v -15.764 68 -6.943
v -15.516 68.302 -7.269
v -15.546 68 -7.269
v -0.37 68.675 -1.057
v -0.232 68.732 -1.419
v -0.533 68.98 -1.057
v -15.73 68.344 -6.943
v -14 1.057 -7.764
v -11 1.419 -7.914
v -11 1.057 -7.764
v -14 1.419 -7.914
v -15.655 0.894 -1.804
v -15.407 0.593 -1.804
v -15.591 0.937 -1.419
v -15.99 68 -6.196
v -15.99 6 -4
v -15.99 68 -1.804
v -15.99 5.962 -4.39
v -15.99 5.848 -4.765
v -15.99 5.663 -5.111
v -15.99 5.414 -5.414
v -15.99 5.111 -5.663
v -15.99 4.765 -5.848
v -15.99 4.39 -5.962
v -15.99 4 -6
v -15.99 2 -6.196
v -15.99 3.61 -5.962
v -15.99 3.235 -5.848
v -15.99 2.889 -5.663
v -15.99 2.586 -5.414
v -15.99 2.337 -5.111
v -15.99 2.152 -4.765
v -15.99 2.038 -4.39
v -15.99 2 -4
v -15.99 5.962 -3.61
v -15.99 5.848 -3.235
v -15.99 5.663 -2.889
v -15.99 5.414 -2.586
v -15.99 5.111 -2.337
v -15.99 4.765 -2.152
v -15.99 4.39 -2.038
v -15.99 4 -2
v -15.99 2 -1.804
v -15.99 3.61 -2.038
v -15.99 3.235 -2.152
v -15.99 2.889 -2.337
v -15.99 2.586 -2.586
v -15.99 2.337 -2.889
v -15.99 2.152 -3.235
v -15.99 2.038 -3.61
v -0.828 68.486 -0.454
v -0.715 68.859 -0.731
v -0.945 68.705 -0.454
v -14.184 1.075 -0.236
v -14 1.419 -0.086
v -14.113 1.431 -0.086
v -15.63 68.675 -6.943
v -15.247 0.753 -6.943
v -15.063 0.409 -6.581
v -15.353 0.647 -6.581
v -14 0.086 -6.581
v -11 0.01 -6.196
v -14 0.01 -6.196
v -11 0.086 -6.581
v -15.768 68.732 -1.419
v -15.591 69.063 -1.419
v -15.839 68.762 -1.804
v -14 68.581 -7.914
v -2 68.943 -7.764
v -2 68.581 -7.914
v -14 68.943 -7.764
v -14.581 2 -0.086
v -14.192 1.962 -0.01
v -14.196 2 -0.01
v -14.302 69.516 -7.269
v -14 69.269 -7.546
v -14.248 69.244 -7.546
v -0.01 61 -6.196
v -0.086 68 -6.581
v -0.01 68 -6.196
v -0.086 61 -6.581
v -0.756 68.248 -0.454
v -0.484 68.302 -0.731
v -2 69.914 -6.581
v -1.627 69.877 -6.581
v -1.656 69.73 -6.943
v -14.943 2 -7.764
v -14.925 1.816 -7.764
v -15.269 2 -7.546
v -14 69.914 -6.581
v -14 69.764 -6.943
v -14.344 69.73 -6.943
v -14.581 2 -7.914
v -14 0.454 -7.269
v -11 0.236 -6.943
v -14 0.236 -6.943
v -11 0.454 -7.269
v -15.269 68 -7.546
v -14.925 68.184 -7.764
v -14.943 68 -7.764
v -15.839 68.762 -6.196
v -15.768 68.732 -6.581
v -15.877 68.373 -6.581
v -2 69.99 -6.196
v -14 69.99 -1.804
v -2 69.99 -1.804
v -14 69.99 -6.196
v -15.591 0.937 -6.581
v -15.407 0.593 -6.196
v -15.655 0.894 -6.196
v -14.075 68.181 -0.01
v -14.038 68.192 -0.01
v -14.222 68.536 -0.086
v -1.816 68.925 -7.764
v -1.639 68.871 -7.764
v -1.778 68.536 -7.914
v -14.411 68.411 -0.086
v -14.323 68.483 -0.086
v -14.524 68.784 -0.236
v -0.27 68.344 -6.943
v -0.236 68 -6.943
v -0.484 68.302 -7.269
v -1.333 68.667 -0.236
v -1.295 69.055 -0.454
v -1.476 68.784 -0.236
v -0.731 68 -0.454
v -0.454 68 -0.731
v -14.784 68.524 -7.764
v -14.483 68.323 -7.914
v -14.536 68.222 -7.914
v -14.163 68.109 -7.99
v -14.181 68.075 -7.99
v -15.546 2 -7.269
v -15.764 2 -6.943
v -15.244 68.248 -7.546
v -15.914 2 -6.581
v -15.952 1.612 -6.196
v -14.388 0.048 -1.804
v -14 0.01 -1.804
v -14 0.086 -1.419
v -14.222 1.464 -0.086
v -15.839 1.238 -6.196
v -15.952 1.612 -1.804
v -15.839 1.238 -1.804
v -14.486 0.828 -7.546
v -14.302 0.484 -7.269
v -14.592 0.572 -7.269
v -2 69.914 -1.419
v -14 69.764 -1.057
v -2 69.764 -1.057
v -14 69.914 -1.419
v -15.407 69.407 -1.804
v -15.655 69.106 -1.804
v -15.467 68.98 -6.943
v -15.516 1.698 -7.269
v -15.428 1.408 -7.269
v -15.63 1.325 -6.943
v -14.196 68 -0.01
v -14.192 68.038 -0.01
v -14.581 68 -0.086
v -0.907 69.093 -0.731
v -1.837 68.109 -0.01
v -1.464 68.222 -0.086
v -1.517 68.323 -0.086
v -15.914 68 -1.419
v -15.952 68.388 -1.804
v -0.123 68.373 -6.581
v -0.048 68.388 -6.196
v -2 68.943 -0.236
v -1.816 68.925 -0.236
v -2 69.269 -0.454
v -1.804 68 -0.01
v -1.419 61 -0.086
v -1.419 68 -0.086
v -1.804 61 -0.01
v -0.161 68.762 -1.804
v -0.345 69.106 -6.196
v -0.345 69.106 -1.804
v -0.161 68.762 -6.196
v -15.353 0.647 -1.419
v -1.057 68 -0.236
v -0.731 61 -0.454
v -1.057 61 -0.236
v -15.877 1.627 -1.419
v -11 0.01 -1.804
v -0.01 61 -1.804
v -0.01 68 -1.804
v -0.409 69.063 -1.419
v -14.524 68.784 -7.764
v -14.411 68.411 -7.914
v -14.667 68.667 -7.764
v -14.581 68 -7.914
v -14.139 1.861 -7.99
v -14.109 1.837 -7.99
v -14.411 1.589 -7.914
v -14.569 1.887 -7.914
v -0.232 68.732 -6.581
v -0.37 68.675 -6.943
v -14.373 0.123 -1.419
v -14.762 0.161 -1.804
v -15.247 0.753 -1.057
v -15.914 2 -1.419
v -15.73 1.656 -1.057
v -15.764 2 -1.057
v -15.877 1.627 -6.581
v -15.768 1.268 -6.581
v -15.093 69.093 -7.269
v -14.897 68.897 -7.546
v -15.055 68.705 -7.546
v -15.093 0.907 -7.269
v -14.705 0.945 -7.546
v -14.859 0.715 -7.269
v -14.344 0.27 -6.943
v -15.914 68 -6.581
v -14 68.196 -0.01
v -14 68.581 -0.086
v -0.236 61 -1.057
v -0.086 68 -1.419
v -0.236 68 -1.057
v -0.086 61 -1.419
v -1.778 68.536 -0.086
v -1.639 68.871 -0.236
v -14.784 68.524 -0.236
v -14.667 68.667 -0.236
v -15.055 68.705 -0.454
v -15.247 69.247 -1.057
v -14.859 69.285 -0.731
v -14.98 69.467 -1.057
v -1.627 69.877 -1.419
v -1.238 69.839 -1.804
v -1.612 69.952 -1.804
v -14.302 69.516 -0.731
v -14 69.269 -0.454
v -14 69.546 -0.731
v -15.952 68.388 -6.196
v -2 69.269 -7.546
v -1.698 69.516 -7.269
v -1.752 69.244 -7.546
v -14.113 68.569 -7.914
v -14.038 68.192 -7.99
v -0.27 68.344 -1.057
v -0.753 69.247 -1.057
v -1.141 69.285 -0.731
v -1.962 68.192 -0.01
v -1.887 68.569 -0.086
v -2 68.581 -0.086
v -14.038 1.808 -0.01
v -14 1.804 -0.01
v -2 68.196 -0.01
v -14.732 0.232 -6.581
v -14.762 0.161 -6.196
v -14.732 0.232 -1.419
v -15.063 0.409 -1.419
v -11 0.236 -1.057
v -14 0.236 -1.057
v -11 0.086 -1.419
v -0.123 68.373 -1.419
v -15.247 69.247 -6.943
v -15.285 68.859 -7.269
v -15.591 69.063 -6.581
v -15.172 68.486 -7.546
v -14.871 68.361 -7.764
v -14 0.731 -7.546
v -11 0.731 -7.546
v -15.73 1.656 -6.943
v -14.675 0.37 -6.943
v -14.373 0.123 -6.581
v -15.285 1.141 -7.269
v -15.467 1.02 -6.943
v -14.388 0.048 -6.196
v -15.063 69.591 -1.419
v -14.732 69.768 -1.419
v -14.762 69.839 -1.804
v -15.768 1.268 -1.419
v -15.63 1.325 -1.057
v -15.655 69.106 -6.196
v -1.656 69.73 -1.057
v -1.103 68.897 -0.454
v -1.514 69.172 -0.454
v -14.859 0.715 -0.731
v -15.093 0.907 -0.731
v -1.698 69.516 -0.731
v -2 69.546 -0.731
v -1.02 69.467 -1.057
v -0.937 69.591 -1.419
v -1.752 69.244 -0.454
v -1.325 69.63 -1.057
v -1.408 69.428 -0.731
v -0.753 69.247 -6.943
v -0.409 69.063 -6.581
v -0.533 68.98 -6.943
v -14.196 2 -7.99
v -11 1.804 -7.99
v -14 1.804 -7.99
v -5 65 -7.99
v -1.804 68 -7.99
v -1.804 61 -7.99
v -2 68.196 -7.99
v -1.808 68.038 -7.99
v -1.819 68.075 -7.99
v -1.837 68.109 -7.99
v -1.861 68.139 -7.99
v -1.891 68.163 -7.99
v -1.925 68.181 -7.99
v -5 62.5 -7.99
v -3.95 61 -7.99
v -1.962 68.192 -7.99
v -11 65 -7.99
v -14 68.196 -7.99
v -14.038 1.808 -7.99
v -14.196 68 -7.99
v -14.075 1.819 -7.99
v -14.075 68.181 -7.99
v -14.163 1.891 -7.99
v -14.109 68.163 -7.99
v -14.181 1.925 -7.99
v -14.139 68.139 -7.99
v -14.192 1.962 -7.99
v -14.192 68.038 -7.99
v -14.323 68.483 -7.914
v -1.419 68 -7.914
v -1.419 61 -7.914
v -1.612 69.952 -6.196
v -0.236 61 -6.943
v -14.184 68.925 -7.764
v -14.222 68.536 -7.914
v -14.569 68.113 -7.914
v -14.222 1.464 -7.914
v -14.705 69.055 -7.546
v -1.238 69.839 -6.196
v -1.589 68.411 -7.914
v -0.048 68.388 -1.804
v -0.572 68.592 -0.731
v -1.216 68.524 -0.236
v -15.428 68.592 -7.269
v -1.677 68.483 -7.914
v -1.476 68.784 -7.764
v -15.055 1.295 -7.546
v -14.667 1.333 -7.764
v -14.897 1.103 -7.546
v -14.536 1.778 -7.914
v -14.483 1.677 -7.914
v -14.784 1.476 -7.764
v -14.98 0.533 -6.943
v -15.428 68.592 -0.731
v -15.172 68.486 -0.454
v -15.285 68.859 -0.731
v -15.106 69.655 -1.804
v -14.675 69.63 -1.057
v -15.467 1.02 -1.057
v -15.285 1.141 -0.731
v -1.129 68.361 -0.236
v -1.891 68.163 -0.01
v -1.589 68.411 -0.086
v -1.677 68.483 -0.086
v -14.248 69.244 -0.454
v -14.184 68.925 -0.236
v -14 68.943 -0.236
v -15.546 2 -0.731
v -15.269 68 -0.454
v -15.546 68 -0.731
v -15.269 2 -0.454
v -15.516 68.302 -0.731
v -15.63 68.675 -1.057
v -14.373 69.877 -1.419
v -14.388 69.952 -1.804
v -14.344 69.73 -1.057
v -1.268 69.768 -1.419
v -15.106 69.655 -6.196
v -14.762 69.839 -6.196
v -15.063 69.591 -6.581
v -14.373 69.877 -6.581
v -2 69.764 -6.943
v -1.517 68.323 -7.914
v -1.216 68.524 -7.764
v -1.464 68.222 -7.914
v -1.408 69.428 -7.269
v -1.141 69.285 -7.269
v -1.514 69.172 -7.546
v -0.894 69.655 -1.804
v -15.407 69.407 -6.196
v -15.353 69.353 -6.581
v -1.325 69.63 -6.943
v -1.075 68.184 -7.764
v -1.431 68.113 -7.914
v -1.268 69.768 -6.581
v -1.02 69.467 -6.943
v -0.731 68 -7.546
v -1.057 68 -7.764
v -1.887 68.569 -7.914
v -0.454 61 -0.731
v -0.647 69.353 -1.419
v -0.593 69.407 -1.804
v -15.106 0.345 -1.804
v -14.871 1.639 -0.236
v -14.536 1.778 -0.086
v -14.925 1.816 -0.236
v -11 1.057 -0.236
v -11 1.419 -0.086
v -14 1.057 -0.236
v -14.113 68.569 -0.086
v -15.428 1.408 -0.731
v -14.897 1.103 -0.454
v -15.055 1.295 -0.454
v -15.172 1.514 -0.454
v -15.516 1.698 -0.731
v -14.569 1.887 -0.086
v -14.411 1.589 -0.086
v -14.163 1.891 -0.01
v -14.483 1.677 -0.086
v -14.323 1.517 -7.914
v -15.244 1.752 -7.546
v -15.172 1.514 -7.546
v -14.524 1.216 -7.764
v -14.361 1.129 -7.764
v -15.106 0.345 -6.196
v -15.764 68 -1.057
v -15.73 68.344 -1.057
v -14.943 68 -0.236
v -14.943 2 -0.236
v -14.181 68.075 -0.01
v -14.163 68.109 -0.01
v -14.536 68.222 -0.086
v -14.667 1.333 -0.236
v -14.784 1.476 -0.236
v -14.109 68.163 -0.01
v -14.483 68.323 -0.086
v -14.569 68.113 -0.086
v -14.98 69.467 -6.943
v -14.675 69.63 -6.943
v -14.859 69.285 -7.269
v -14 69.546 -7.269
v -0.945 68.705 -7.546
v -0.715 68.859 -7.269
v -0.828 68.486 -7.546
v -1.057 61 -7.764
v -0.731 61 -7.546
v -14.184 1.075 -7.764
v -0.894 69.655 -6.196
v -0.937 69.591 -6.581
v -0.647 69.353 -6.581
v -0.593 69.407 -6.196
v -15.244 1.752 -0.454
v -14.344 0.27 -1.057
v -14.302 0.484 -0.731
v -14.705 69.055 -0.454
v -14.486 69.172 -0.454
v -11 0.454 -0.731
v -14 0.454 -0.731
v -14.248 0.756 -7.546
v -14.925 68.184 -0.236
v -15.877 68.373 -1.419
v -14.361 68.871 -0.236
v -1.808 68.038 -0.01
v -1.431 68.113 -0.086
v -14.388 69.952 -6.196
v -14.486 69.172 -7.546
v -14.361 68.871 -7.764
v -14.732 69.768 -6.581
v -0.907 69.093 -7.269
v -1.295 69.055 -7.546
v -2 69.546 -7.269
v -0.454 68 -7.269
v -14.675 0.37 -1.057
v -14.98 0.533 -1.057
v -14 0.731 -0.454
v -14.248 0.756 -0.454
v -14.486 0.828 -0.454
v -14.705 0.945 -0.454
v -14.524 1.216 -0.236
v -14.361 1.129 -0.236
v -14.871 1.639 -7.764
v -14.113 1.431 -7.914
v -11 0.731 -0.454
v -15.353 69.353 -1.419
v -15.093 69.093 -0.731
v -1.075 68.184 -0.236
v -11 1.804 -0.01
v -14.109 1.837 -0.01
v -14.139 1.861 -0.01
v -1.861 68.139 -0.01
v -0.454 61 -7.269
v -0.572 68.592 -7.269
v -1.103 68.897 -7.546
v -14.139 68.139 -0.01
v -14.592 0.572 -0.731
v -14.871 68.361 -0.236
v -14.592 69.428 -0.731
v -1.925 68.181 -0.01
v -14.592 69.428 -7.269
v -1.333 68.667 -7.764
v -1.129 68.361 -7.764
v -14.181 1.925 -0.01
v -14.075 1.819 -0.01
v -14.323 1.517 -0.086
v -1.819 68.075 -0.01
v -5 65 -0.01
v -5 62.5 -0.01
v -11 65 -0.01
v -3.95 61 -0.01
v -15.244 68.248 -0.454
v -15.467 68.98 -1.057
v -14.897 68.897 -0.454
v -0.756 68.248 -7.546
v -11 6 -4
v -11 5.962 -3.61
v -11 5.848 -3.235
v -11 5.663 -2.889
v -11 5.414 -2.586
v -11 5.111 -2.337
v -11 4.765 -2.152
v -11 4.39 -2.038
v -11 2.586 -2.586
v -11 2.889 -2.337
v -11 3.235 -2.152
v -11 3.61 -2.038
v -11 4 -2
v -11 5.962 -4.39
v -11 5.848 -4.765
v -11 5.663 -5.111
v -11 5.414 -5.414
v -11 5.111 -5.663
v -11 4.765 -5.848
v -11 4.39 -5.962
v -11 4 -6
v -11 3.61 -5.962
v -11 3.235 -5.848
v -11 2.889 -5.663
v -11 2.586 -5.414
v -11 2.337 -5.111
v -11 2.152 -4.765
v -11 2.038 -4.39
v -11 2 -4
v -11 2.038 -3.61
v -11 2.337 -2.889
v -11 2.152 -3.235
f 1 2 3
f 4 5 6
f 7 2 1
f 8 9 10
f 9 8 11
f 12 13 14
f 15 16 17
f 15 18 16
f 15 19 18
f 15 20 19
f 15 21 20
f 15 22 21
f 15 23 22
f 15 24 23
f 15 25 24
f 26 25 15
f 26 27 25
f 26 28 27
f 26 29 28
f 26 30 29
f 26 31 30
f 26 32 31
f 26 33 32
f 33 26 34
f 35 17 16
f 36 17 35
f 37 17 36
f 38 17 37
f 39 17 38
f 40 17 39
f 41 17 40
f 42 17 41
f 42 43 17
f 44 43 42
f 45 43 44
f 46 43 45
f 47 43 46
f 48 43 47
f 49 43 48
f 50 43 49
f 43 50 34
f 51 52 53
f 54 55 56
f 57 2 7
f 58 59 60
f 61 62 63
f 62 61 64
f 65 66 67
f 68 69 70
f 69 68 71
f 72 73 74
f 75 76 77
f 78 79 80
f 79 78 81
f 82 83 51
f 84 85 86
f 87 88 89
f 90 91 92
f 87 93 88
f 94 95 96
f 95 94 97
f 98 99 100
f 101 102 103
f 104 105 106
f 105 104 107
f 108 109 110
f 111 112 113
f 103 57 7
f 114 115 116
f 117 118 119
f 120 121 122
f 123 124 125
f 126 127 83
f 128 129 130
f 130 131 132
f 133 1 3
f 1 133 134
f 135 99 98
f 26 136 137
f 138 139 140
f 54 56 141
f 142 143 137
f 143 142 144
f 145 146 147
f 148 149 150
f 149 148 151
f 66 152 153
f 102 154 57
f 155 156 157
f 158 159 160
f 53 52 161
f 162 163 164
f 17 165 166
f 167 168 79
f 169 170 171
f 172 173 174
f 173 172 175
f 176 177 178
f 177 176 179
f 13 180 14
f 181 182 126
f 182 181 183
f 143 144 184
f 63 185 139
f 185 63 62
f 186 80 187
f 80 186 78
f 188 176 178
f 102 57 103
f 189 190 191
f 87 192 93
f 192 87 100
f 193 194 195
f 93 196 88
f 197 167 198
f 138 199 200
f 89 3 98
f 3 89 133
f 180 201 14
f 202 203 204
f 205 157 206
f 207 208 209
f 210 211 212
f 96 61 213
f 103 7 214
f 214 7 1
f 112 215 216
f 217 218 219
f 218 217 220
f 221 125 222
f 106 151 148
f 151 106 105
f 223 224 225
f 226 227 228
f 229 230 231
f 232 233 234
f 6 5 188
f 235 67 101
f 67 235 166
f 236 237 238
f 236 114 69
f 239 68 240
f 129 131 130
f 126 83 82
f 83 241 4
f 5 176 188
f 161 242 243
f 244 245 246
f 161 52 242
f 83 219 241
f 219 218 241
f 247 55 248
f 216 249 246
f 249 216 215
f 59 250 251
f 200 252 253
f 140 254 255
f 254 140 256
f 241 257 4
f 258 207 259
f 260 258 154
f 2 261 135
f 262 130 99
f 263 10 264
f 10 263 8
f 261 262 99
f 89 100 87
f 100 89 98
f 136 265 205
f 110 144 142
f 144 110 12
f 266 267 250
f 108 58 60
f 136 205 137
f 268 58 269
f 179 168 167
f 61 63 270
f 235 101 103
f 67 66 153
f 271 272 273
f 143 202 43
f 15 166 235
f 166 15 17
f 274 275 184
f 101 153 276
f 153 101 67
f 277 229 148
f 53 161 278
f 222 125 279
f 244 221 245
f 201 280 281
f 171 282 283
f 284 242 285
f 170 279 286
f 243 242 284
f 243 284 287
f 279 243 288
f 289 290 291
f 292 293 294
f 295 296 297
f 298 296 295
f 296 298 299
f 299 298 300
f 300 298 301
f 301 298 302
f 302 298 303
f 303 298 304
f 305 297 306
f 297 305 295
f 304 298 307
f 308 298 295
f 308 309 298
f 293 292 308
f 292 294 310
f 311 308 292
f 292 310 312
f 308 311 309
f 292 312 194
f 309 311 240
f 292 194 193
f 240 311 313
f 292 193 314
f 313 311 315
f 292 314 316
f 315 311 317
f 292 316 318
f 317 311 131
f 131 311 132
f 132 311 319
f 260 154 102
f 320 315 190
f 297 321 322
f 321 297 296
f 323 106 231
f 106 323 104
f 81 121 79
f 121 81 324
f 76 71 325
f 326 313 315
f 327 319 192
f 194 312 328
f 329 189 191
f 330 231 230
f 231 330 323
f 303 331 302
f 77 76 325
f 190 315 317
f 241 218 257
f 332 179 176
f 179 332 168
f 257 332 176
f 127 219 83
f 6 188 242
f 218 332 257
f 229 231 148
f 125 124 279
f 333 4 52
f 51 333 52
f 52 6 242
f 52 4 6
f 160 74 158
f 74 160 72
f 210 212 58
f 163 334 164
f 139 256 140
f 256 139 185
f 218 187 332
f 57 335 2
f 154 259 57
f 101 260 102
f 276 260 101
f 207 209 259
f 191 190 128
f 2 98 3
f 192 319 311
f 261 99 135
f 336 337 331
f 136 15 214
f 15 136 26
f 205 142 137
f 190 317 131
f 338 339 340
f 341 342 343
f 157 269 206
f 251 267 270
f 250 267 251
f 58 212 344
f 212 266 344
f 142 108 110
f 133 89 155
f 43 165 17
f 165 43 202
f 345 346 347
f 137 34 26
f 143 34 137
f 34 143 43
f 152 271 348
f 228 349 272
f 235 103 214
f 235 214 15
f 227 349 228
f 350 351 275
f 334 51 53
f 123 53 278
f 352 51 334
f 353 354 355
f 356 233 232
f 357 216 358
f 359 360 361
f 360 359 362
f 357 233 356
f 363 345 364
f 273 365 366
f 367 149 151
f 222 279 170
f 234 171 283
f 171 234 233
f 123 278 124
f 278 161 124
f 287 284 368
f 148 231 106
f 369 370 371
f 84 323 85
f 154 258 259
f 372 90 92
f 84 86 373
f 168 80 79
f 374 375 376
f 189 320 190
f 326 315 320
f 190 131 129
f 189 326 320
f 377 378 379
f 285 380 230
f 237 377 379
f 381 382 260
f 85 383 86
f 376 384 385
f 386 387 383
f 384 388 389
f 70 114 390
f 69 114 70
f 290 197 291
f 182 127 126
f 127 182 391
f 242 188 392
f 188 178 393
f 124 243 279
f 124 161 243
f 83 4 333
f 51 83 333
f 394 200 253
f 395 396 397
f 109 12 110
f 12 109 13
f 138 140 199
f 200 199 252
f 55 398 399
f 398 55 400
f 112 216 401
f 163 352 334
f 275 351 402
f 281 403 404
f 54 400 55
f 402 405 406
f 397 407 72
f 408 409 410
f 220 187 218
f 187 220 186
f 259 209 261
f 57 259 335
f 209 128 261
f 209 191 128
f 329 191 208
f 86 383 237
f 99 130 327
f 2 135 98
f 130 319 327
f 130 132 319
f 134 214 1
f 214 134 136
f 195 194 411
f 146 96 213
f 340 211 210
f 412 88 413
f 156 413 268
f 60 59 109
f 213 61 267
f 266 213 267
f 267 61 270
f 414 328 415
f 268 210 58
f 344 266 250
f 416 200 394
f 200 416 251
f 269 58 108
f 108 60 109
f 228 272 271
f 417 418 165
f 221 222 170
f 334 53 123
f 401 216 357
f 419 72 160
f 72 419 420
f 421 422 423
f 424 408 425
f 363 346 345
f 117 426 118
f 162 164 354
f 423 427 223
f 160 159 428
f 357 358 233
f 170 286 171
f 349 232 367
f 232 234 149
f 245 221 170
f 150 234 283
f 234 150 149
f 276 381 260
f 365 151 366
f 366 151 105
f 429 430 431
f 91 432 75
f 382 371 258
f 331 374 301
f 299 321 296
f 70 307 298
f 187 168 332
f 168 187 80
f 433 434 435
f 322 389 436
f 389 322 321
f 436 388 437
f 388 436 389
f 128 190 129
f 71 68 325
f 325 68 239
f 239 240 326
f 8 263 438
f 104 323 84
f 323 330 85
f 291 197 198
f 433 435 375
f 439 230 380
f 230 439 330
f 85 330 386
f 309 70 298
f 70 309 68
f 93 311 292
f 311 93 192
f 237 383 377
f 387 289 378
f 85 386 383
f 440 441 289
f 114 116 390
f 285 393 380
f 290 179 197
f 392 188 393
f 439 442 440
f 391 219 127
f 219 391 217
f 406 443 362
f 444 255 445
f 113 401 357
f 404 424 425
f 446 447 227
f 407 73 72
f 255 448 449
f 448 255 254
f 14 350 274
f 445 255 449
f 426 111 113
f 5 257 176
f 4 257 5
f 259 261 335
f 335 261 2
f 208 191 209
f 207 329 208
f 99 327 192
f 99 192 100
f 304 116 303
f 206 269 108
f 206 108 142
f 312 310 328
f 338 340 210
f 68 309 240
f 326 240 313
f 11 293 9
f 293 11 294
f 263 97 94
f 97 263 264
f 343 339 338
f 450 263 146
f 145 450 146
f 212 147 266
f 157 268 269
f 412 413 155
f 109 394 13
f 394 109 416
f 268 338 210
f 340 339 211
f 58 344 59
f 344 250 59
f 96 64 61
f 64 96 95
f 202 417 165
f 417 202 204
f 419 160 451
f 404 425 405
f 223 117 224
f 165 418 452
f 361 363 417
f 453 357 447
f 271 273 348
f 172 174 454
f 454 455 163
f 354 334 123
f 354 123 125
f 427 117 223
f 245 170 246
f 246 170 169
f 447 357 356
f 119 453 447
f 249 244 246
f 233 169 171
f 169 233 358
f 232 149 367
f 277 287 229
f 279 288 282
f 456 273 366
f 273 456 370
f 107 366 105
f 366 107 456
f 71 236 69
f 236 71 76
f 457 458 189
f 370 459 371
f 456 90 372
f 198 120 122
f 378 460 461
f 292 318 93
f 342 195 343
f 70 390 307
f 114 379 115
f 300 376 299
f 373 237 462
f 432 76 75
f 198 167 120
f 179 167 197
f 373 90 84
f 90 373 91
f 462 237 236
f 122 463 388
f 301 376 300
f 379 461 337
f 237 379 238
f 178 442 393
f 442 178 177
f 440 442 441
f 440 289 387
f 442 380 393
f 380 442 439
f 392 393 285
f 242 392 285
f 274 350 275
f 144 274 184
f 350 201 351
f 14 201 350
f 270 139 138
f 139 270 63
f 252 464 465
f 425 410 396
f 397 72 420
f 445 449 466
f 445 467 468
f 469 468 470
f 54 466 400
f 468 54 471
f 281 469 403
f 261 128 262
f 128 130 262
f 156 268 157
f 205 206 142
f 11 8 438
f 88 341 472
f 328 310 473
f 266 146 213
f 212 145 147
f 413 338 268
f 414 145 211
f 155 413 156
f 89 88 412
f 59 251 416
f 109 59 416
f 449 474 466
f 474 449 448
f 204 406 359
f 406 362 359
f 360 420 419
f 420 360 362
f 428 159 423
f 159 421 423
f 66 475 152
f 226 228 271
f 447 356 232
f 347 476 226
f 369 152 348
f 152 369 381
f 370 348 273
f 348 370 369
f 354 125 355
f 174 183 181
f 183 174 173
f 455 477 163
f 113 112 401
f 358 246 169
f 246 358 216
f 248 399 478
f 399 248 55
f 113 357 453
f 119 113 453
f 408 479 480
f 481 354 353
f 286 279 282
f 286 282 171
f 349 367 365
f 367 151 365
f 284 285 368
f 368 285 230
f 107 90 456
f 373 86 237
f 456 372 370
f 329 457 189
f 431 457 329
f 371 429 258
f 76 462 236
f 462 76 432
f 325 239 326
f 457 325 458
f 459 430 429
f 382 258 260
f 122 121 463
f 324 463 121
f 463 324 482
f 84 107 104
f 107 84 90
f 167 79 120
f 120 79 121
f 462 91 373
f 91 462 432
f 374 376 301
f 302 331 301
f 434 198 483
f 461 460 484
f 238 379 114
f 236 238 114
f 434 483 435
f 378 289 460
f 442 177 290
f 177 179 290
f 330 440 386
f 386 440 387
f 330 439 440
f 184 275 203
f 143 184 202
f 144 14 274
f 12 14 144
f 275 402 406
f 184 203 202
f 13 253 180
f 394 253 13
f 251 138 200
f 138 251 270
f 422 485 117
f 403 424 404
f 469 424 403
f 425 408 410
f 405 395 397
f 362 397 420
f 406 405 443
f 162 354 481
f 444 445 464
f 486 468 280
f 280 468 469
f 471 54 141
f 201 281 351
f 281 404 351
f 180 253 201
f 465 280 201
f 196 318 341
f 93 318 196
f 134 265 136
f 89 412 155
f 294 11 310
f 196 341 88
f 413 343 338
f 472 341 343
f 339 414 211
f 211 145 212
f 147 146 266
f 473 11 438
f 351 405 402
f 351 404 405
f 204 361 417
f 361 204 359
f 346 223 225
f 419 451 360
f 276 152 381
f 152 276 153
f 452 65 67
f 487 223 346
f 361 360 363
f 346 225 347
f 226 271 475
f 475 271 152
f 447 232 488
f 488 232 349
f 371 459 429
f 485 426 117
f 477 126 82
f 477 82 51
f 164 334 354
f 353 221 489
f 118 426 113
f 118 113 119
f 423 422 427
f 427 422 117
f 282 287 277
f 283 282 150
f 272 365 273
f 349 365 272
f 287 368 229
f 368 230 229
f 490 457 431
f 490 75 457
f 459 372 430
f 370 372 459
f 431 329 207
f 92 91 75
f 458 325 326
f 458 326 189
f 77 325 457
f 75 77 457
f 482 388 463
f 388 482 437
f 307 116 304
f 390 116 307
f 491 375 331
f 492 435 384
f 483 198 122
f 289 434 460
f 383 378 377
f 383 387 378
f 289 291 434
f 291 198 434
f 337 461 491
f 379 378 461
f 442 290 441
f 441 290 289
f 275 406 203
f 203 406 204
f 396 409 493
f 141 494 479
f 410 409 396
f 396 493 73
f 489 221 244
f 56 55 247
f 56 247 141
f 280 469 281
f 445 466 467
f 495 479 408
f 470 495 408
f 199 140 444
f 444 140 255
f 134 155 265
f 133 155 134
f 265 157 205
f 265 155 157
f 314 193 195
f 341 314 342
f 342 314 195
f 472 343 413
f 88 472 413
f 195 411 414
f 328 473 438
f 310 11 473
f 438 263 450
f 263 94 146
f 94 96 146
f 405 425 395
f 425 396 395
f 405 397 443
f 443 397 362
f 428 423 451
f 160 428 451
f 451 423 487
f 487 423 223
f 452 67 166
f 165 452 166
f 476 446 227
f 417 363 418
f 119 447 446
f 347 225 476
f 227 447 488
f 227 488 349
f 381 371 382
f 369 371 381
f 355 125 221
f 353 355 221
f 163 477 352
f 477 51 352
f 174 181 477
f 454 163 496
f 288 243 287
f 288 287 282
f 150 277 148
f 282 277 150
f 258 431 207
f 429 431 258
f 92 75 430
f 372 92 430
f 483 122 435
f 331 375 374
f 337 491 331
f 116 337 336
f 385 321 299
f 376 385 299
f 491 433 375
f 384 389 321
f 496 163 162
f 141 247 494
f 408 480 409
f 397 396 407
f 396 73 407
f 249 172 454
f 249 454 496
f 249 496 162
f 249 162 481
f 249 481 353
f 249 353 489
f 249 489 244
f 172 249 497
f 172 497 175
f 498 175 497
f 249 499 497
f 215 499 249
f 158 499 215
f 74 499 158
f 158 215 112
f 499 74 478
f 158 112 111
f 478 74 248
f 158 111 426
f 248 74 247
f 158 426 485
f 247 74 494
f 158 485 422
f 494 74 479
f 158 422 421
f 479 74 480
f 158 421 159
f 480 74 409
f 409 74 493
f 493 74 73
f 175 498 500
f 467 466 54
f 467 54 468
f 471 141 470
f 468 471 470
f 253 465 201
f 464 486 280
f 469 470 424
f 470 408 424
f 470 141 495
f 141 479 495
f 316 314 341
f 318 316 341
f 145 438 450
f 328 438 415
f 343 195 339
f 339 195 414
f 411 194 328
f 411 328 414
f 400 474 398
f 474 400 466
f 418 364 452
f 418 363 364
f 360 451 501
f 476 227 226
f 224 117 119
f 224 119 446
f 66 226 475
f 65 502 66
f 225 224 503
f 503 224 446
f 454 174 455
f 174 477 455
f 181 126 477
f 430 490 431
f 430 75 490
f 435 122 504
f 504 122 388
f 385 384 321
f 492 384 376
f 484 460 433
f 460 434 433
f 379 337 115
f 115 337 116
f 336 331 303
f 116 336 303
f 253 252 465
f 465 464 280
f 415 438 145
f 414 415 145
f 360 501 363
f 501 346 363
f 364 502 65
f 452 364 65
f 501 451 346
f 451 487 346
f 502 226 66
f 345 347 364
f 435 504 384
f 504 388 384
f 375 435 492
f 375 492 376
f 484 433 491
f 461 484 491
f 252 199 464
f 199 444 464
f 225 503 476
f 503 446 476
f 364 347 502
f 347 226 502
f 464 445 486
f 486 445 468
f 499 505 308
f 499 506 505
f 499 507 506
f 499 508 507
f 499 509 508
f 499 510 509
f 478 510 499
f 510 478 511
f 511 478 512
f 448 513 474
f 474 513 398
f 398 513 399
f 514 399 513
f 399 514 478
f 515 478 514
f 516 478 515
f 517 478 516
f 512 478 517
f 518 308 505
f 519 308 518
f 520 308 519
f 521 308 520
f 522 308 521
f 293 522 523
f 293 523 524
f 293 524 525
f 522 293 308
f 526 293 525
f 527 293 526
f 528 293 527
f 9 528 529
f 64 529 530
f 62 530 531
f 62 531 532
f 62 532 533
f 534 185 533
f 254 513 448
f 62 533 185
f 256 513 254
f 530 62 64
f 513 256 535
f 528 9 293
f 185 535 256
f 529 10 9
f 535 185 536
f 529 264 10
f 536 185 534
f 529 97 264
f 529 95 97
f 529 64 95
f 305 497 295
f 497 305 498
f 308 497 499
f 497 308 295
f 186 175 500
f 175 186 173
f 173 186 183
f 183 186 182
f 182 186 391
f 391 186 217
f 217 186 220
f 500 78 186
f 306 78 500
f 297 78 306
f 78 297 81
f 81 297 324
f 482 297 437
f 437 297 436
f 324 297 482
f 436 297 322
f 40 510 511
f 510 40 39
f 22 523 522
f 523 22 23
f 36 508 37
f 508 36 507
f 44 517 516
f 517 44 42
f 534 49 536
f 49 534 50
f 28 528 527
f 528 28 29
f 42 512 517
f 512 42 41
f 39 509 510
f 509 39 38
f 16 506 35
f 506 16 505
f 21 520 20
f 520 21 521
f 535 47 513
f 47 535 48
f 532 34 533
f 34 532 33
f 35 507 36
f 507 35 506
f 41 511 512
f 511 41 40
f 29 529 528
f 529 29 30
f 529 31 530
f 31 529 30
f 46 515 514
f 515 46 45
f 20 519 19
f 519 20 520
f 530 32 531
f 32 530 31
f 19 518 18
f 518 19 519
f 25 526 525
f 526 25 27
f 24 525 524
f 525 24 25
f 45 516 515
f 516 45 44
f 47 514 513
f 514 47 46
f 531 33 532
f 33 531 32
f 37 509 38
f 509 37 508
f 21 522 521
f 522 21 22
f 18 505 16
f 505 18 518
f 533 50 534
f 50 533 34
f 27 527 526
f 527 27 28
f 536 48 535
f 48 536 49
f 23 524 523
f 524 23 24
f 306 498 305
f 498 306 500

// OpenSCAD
module round_edges_box_hull(boundingbox=[1,1,1], r=0.1, only_bottom=false) {
    x=boundingbox[0]/2;
    y=boundingbox[1]/2;
    z=boundingbox[2]/2;
    hull() {
        for(x1=[-x+r,x-r]) {
            for(y1=[-y+r,y-r]) {
                for(z1=[-z+r,z-r]) {
                    if( only_bottom == true && z1>0) {
                        translate([x1,y1,z1]) cylinder(r=r, h=r*2, center=true);
                    } else {
                        translate([x1,y1,z1]) sphere(r=r, center=true);
                    }
                }
            }
        }
    }
}

w=5;
h=8;
l=70;
$fn=32;

rotate([0,180,0])
difference() {
    //cube([2*w+6, l, h]);
    translate([w+3, l/2,h/2]) round_edges_box_hull([2*w+6, l, h],r=2);
    translate([w, -w, -0.5]) cube([6, l, h+1]);
    translate([-0.5, -w-4, -0.5]) cube([6+1, l, h+1]);
    translate([0,4,h/2]) rotate([0,90,0]) cylinder(r=4/2, h=30);
    translate([w, -w-(w/2), -0.5]) translate([0,l,h+1]) rotate([0,0,-35]) translate([0,-l,-h-1]) cube([4, l, h+1]);
}
